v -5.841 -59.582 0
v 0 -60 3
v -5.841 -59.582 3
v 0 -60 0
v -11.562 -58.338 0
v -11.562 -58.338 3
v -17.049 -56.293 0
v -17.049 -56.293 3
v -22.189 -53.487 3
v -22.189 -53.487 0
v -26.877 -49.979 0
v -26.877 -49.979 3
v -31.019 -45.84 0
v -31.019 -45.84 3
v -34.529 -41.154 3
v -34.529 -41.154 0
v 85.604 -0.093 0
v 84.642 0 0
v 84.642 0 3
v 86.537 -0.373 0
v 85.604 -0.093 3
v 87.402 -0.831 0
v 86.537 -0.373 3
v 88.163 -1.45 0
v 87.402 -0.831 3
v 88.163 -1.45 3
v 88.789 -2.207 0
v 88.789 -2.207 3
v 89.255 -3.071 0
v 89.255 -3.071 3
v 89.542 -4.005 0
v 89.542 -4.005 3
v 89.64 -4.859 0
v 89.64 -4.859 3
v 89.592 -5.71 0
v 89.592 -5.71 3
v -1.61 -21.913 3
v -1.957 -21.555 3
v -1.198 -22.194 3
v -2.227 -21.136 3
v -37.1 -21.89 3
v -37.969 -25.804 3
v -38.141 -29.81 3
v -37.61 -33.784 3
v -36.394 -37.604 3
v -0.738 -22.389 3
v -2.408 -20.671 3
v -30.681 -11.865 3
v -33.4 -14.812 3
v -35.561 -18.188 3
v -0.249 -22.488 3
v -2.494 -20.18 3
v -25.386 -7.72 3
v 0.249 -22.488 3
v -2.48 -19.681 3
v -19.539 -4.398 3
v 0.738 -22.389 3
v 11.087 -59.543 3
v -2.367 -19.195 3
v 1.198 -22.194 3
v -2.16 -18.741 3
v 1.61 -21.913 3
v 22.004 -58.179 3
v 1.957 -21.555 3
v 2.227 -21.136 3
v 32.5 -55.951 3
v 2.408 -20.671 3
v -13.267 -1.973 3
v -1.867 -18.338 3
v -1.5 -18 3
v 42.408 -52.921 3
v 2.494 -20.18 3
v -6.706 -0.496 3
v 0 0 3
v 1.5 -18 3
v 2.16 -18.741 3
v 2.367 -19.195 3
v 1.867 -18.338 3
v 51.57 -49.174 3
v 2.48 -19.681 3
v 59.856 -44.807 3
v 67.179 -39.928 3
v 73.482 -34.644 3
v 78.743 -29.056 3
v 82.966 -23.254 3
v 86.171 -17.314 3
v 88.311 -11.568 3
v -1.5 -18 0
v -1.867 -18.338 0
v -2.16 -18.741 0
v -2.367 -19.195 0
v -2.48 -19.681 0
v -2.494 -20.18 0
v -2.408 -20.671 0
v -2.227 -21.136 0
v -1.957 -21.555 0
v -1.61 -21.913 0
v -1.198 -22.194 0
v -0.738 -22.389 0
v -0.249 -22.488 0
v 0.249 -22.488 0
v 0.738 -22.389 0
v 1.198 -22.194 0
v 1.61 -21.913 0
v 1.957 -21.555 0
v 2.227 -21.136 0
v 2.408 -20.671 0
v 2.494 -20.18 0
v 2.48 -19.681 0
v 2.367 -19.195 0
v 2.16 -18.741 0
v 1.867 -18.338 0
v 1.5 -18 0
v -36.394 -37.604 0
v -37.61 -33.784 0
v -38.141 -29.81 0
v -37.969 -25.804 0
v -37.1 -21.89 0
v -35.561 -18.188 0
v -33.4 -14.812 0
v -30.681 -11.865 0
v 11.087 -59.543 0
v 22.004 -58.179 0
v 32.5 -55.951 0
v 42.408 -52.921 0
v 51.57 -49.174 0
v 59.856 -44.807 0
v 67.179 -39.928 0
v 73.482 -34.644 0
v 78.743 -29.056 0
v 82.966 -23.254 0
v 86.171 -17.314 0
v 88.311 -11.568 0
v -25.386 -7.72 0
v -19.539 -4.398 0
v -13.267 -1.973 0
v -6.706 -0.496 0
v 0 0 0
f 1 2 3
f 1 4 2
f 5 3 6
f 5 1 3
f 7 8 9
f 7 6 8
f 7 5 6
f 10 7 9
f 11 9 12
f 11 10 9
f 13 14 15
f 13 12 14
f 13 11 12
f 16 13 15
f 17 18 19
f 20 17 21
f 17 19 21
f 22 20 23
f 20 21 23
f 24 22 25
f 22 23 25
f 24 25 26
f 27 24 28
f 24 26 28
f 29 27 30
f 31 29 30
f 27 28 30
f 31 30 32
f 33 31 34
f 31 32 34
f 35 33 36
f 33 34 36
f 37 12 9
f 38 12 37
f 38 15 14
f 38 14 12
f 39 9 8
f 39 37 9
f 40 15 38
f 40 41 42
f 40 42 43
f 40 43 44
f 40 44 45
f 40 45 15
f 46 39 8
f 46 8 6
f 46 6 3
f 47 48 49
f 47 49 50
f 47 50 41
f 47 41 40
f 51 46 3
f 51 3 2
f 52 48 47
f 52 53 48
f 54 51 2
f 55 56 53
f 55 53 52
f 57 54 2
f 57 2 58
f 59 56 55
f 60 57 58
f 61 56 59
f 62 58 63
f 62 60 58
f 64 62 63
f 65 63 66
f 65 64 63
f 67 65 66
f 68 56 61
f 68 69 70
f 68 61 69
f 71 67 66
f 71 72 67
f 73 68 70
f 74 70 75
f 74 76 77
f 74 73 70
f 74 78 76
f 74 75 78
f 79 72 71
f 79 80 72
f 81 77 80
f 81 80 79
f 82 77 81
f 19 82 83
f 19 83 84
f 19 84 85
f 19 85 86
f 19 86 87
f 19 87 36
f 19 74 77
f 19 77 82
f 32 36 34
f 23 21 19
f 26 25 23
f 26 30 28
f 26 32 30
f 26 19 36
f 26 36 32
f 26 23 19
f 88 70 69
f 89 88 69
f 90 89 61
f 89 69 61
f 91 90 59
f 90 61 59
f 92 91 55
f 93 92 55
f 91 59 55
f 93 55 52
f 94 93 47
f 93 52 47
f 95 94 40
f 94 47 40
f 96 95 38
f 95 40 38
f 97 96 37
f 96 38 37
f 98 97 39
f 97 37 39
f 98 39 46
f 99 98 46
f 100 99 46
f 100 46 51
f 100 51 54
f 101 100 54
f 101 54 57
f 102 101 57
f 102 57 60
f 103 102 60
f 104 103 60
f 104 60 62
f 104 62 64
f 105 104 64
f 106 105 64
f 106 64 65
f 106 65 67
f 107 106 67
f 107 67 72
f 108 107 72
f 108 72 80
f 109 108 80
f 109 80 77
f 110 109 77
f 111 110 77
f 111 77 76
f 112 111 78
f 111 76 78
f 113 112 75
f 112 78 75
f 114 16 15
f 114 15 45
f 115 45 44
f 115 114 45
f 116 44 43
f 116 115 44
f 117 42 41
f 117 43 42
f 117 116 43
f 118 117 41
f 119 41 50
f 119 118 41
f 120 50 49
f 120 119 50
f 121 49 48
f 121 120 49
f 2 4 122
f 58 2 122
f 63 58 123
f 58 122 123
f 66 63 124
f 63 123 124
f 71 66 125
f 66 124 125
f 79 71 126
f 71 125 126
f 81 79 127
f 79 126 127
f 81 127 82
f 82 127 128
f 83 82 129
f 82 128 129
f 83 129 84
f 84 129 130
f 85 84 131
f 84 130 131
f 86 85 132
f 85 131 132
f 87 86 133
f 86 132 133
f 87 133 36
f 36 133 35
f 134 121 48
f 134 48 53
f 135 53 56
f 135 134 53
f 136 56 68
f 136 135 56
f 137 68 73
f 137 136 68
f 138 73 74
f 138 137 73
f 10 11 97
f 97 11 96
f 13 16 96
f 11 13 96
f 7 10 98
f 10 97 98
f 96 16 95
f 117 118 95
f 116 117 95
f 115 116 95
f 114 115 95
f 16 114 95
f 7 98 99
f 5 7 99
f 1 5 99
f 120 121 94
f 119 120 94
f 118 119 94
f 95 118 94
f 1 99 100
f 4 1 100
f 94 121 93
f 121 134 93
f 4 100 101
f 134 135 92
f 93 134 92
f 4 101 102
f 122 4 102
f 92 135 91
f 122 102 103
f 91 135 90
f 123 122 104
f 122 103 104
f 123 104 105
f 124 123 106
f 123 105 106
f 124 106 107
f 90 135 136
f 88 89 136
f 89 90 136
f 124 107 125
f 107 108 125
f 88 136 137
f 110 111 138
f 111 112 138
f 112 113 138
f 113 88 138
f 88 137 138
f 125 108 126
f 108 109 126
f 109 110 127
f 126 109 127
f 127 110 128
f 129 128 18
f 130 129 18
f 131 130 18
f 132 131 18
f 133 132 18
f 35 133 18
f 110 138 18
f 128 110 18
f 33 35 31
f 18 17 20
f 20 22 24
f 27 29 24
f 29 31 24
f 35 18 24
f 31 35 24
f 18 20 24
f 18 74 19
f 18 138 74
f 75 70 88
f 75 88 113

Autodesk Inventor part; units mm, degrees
ref_plane "YZ Plane" through (0, 0, 0) normal (1, 0, 0) x (0, 1, 0)
ref_plane "XZ Plane" through (0, 0, 0) normal (0, 1, 0) x (-1, 0, 0)
ref_plane "XY Plane" through (0, 0, 0) normal (0, 0, 1) x (1, 0, 0)
sketch "Sketch1" plane through (0, 0, 0) normal (0, 0, 1) x (1, 0, 0)
  ellipse E0 centre (0, 0) end of major axis (90, 0) minor radius 60 (0, -60) -> (90, 0) ccw
  line L0 (0, 0) -> (90, 0)
  line L1 (0, -60) -> (0, 0)
  arc A0 (-34.5293, -41.1535) -> (0, -60) centre (0, -18.9457) ccw
  arc A1 (-30.6814, -11.8648) -> (-34.5293, -41.1535) centre (-15.2956, -28.7832) ccw
  arc A2 (0, 0) -> (-30.6814, -11.8648) centre (0, -45.6024) ccw
  point P0 (-30.1245, -11.3745)
  dimension "d0" = 90
  dimension "d1" = 60
extrude "Extrusion1" add sketch "Sketch1" along normal blind 3
fillet "Fillet1" radius 5 1 edges at (90, 0, 1.5)
sketch "Sketch2" plane through (0, 0, 3) normal (0, 0, 1) x (1, 0, 0)
  arc A0 (-1.5, -18) -> (1.5, -18) centre (0, -20) ccw
  line L0 (-1.5, -18) -> (1.5, -18)
  point P0 (0, 0)
  dimension "d5" = 5
  dimension "d6" = 20
  dimension "d7" = 2
extrude "Extrusion2" cut sketch "Sketch2" against normal blind 3
properties part number "cam3"
